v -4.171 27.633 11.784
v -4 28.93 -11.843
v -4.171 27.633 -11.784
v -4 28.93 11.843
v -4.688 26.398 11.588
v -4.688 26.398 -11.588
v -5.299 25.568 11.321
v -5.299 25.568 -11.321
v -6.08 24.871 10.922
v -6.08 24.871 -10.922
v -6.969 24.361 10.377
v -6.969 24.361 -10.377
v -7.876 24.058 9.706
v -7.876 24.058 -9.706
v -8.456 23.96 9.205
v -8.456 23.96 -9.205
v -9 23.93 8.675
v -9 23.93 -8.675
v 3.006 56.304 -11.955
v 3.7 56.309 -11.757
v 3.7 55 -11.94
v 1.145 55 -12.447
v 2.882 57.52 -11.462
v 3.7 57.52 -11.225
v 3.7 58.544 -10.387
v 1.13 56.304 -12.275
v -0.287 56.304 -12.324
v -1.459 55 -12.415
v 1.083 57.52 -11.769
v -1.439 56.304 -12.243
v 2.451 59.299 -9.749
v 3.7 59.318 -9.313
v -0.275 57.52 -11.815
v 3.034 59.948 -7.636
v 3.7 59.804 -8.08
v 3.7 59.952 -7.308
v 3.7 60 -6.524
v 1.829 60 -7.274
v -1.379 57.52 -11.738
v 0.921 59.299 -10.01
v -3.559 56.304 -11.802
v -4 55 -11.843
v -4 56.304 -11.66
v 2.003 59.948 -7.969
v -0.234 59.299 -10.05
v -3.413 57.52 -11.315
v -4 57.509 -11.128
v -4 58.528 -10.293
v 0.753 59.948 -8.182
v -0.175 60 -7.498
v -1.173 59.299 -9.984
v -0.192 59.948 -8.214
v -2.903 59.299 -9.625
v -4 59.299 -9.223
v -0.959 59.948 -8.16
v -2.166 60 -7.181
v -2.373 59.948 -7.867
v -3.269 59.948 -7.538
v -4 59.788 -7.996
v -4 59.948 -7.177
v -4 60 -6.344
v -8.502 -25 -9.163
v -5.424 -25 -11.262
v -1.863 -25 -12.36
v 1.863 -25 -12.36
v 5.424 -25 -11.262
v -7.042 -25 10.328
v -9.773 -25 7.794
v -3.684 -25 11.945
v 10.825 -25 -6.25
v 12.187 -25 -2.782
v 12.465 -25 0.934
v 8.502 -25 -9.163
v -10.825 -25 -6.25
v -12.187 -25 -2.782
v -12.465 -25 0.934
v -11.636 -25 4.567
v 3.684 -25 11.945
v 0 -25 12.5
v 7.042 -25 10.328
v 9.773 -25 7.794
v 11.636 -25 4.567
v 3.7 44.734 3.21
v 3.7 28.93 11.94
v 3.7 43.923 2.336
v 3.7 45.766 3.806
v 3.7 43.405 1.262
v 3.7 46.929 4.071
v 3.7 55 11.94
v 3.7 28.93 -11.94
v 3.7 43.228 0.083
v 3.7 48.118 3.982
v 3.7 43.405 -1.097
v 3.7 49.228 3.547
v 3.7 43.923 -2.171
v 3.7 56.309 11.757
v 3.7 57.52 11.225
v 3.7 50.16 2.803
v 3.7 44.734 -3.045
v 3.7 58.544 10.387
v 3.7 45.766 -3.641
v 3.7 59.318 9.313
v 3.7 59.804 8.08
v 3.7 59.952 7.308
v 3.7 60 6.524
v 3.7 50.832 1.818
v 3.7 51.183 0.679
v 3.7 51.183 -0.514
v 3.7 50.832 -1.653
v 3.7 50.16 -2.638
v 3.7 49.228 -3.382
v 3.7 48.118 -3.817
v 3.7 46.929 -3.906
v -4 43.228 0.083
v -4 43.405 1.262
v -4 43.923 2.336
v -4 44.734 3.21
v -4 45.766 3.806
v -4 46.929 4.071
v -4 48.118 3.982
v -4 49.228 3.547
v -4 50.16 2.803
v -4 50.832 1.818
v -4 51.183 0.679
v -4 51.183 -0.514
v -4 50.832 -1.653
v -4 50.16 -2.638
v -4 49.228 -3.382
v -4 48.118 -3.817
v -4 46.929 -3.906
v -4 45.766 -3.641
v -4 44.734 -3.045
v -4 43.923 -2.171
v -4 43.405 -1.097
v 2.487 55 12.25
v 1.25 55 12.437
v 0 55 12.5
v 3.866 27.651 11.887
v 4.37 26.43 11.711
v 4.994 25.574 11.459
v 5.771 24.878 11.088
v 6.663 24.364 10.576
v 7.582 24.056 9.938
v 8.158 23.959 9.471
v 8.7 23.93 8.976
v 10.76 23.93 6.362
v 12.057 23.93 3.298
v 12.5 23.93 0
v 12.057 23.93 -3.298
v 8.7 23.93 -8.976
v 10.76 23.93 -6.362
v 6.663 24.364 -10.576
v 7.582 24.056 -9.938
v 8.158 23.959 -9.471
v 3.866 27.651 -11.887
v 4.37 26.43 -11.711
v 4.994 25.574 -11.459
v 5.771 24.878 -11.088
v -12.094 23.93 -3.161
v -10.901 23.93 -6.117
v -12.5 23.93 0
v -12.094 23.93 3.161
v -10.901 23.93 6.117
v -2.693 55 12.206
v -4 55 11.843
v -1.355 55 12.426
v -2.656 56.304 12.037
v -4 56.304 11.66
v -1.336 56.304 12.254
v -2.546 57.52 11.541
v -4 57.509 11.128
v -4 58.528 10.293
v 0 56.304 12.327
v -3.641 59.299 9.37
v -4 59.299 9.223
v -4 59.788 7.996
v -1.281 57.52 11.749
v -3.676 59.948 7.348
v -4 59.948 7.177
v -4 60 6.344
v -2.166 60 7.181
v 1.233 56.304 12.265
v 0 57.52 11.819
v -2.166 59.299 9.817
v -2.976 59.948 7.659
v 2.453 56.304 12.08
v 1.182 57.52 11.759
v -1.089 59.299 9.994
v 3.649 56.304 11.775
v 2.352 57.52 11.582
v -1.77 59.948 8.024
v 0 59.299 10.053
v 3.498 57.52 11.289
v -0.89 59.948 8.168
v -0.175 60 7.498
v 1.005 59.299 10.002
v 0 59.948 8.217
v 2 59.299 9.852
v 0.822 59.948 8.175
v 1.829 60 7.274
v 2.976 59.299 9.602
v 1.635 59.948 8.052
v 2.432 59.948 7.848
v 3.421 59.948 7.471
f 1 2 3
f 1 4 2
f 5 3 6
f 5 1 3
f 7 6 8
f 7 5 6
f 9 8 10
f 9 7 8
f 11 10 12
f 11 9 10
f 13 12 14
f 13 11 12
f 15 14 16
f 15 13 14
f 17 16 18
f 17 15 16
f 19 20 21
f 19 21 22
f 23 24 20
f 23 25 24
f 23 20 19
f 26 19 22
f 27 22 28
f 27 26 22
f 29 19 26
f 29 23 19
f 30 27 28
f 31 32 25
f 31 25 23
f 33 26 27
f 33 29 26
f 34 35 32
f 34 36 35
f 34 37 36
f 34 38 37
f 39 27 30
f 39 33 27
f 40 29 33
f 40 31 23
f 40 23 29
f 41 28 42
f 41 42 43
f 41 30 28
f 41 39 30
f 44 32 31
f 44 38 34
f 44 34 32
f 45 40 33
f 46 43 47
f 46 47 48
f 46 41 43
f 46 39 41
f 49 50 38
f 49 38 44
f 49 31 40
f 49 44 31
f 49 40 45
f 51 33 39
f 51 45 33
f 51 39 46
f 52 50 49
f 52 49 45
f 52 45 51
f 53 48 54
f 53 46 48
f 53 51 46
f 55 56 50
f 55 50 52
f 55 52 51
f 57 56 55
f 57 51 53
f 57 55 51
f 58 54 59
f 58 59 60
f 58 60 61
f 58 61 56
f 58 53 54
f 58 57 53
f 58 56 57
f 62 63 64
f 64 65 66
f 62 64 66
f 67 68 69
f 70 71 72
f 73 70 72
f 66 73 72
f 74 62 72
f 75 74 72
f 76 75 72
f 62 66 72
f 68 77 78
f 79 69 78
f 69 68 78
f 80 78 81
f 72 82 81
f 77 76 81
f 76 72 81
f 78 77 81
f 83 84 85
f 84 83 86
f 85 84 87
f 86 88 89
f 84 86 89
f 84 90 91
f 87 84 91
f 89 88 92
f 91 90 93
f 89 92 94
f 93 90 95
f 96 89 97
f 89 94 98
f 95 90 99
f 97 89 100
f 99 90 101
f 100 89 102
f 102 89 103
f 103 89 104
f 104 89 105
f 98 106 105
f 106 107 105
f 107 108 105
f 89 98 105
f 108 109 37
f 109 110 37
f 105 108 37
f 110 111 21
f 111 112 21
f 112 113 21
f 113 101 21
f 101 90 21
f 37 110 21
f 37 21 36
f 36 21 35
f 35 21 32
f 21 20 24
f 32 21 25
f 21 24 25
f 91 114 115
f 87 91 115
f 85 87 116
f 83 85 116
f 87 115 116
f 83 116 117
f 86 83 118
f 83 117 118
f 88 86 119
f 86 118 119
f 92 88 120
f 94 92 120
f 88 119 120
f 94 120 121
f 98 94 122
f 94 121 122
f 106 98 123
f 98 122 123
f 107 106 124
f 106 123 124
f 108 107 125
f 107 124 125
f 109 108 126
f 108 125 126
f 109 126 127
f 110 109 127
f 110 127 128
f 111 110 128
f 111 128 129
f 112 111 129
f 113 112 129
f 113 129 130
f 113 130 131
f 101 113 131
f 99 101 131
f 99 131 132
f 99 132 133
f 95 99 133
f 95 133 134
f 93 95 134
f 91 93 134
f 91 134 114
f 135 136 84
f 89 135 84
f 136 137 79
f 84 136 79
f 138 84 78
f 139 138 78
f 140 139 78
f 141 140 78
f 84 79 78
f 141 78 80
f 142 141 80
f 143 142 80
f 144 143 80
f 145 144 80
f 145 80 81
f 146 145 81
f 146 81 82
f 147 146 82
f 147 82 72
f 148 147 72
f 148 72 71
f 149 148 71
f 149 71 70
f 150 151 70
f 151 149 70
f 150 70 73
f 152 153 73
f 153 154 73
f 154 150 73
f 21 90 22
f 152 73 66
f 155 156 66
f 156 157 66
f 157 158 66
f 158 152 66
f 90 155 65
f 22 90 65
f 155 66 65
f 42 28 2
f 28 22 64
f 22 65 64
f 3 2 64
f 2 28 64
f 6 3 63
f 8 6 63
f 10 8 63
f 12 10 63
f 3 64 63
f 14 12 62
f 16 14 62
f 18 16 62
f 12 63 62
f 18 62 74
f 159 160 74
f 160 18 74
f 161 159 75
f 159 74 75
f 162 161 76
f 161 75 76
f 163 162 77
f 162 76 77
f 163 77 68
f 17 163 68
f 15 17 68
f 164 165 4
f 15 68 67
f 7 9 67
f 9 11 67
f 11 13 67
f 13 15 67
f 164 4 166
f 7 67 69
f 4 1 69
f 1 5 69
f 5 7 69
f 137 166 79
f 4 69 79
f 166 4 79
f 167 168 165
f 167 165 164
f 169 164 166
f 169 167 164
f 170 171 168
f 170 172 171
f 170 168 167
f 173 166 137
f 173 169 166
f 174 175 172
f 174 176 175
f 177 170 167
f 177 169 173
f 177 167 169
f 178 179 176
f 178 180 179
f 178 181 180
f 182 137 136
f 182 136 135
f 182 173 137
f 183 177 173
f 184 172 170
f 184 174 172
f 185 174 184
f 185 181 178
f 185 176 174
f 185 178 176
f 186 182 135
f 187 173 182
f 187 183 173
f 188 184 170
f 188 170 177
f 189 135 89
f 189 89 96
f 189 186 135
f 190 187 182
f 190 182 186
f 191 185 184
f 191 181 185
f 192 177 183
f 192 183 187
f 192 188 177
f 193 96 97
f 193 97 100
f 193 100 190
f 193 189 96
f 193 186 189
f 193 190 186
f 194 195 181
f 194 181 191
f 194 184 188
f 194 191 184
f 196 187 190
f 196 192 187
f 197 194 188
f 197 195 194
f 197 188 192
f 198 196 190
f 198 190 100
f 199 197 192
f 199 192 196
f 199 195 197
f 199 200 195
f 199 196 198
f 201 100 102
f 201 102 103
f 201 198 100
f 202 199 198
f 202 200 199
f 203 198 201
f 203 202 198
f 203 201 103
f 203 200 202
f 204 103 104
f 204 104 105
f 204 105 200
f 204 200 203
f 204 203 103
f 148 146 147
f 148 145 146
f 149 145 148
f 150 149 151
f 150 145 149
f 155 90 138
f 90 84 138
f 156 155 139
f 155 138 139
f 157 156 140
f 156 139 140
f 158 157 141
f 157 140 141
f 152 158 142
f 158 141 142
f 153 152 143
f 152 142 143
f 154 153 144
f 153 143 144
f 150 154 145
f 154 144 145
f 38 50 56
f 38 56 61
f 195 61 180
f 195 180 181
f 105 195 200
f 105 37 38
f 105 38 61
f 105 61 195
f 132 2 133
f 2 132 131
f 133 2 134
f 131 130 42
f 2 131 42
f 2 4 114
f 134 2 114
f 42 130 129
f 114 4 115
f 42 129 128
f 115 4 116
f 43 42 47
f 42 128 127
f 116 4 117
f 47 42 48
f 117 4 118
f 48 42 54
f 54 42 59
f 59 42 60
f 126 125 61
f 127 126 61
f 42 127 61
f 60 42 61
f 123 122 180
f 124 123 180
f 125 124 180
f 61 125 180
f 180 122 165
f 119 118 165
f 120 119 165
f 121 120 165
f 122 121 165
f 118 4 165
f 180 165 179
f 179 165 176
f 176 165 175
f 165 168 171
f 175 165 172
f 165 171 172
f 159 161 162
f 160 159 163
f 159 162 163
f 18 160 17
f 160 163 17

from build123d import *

# Parameters (mm, degrees)
EXTRUDE_START       = -25
SKETCH_1_R          = 12.5
EXTRUDE_1_DEPTH     = 85
SKETCH_2_W          = 12.354431351
SKETCH_2_H          = 42
SKETCH_2_W_2        = 12.054431351
CUT_EXTRUDE_2_DEPTH = 30
FILLET_2_R          = 5
SKETCH_3_R          = 4
CUT_EXTRUDE_1_DEPTH = 64.470465687
FILLET_3_R          = 5


with BuildPart() as part:
    # Эскиз1 → Вытянуть1 (new body)
    with BuildSketch(Plane(origin=(0, 0, 0), x_dir=(1, 0, 0), z_dir=(0, 1, 0)).offset(EXTRUDE_START)):
        with Locations(Location((0, 0, 0), (0, 0, 270))):
            Circle(SKETCH_1_R)
    extrude(amount=EXTRUDE_1_DEPTH)

    # Эскиз2 → Вытянуть2 (cut, symmetric)
    with BuildSketch(Plane.XY):
        with Locations((9.877215676, 44.929871577)):
            Rectangle(SKETCH_2_W, SKETCH_2_H)
        with Locations((-10.027215676, 44.929871577)):
            Rectangle(SKETCH_2_W_2, SKETCH_2_H)
    extrude(amount=CUT_EXTRUDE_2_DEPTH, both=True, mode=Mode.SUBTRACT)

    # Скругление2
    fillet_2_edges = [part.edges().sort_by_distance(p)[0] for p in [
        (-0.157665968, 60, -12.499005618),
        (-2.026821276, 60, 12.33458534),
    ]]
    fillet(fillet_2_edges, radius=FILLET_2_R)

    # Эскиз3 → Вырез-Вытянуть1 (cut, through all)
    with BuildSketch(Plane.ZY.offset(4)):
        with Locations(Location((0.082516108, 47.227633341, 0), (0, 0, 270))):
            Circle(SKETCH_3_R)
    extrude(amount=-CUT_EXTRUDE_1_DEPTH, mode=Mode.SUBTRACT)

    # Скругление3
    fillet_3_edges = [part.edges().sort_by_distance(p)[0] for p in [
        (3.7, 23.929871577, 0),
        (-4, 23.929871577, 0),
    ]]
    fillet(fillet_3_edges, radius=FILLET_3_R)


solid = part.part
